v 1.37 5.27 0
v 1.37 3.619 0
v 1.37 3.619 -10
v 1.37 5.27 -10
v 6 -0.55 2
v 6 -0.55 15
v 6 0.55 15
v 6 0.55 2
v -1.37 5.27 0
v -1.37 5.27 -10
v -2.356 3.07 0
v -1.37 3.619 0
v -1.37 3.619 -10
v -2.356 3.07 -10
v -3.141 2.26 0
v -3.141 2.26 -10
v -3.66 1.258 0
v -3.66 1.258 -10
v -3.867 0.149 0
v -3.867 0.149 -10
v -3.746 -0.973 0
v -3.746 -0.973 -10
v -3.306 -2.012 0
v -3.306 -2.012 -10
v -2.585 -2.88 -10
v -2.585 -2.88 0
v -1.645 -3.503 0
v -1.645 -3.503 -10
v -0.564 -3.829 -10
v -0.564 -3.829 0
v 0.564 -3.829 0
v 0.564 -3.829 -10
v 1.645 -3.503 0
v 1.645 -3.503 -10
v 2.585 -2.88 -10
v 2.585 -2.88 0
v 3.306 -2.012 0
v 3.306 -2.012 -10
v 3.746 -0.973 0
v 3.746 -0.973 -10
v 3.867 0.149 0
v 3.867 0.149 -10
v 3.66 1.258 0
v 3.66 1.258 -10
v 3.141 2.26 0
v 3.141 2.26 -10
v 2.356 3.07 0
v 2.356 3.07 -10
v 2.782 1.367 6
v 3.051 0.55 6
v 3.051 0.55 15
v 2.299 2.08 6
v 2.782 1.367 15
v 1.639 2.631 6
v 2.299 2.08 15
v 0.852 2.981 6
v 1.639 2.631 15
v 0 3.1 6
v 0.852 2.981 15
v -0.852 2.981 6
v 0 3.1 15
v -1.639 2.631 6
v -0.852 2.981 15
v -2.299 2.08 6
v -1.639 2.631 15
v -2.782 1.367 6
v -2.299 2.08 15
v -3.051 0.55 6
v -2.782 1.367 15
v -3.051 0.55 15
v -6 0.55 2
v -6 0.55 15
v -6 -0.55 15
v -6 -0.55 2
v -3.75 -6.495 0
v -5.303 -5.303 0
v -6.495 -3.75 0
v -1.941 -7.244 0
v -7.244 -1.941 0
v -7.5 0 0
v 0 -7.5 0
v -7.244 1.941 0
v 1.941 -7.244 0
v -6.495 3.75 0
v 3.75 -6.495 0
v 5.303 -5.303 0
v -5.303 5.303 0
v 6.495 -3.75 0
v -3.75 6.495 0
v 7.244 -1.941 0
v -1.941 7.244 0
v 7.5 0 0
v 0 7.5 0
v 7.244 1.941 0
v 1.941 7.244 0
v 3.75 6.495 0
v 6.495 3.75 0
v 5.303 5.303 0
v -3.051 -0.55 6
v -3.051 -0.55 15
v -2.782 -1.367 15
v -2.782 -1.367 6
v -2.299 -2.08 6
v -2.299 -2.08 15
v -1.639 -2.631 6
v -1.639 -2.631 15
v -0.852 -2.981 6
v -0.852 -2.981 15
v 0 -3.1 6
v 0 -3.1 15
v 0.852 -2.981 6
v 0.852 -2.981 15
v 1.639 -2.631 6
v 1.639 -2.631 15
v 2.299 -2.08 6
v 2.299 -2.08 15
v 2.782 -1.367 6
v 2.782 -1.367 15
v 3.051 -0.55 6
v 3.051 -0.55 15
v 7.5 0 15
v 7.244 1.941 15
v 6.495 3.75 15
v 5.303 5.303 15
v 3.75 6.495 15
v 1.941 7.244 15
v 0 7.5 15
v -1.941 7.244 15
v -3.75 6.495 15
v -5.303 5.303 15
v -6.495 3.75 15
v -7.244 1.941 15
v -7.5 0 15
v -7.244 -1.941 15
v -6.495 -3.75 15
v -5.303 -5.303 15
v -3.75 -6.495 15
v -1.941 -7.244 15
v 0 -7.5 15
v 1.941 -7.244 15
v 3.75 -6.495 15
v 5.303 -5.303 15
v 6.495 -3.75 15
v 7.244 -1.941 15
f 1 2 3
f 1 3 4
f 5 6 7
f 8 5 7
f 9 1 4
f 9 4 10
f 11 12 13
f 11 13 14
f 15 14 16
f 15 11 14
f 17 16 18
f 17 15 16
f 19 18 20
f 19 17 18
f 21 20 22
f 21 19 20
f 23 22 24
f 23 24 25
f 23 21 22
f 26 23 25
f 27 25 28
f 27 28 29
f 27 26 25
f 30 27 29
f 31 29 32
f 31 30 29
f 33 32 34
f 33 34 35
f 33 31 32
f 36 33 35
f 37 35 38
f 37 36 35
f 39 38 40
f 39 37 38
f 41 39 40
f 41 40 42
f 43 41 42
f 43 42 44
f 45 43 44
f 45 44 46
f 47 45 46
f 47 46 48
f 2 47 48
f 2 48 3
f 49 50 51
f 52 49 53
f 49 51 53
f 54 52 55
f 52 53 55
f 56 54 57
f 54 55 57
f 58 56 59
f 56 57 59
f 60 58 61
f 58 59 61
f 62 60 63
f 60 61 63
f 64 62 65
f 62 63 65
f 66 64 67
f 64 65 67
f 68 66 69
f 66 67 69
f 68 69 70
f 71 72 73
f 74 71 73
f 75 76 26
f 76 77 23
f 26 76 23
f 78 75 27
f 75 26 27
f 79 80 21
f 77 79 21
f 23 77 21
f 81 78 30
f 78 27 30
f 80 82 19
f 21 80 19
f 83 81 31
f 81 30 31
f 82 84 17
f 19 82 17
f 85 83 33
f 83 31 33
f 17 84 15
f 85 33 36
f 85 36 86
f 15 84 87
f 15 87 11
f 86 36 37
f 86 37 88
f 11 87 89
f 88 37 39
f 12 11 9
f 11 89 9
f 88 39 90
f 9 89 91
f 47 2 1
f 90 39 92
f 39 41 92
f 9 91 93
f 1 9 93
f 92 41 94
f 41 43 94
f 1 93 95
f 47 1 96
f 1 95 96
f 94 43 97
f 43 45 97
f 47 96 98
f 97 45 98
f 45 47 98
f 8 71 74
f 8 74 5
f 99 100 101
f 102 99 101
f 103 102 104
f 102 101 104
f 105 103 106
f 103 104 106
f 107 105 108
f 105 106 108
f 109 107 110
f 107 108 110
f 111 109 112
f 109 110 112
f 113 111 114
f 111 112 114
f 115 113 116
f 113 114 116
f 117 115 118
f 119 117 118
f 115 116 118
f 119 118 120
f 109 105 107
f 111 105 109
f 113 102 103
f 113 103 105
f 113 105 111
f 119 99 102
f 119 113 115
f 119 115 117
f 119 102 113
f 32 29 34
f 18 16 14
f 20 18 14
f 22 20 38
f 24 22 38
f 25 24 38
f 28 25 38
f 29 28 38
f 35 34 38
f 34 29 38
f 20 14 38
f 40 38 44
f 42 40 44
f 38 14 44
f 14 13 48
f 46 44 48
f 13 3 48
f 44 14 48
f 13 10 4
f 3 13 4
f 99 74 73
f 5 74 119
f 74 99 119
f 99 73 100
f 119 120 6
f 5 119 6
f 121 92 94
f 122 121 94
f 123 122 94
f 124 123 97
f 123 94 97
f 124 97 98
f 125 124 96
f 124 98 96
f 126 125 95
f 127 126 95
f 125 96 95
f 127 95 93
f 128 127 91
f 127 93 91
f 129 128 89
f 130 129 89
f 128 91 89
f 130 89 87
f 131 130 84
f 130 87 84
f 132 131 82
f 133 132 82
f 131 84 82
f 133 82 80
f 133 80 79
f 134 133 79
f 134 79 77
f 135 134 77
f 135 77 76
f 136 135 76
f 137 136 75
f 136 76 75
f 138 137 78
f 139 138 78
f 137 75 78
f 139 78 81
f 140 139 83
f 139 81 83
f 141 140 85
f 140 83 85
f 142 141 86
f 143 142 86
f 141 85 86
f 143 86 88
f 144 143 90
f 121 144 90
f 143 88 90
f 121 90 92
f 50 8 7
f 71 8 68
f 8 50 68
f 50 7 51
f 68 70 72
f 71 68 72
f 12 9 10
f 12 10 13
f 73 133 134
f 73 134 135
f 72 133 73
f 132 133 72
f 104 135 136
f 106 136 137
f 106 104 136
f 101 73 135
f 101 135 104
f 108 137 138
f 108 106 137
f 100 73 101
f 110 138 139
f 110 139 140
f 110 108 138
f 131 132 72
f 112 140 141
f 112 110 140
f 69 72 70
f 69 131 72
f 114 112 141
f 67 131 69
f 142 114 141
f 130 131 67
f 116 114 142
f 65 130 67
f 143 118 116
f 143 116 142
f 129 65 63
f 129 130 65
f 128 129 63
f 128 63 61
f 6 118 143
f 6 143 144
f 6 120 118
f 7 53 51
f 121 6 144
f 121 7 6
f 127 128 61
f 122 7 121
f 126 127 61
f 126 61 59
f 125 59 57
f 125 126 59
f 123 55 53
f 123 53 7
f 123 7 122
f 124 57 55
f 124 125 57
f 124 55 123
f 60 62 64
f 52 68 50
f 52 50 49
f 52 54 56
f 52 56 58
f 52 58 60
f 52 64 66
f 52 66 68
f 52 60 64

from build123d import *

# Parameters (mm, degrees)
BOSS_EXTRUDE1_DEPTH = 10
SKETCH5_R           = 7.5
BOSS_EXTRUDE2_DEPTH = 15
SKETCH8_R           = 3.1
CUT_EXTRUDE1_DEPTH  = 9
CUT_EXTRUDE2_DEPTH  = 13


with BuildPart() as part:
    # Sketch4 → Boss-Extrude1 (new body)
    with BuildSketch(Plane.XY):
        with BuildLine():
            Line((-1.37, 5.27), (-1.37, 3.619392214))
            ThreePointArc((-1.37, 3.619392214), (0, -3.87), (1.37, 3.619392214))
            Line((1.37, 3.619392214), (1.37, 5.27))
            Line((1.37, 5.27), (-1.37, 5.27))
        make_face()
    extrude(amount=-BOSS_EXTRUDE1_DEPTH)

    # Sketch5 → Boss-Extrude2 (add)
    with BuildSketch(Plane.XY):
        Circle(SKETCH5_R)
    extrude(amount=BOSS_EXTRUDE2_DEPTH)

    # Sketch8 → Cut-Extrude1 (cut)
    with BuildSketch(Plane.XY.offset(15)):
        Circle(SKETCH8_R)
    extrude(amount=-CUT_EXTRUDE1_DEPTH, mode=Mode.SUBTRACT)

    # Sketch9 → Cut-Extrude2 (cut)
    with BuildSketch(Plane.XY.offset(15)):
        with BuildLine():
            Line((-3.1, 0), (0, 0))
            Line((0, 0), (3.1, 0))
            ThreePointArc((3.1, 0), (3.087680411, 0.276097227), (3.050819562, 0.55))
            Line((3.050819562, 0.55), (0, 0.55))
            Line((0, 0.55), (-3.050819562, 0.55))
            ThreePointArc((-3.050819562, 0.55), (-3.087680411, 0.276097227), (-3.1, 0))
        make_face()
        with BuildLine():
            Line((-6, 0), (-3.1, 0))
            ThreePointArc((-3.1, 0), (-3.087680411, 0.276097227), (-3.050819562, 0.55))
            Line((-3.050819562, 0.55), (-6, 0.55))
            Line((-6, 0.55), (-6, 0))
        make_face()
        with BuildLine():
            ThreePointArc((-3.050819562, -0.55), (-3.087680411, -0.276097227), (-3.1, 0))
            Line((-3.1, 0), (-6, 0))
            Line((-6, 0), (-6, -0.55))
            Line((-6, -0.55), (-3.050819562, -0.55))
        make_face()
        with BuildLine():
            Line((3.1, 0), (0, 0))
            Line((0, 0), (-3.1, 0))
            ThreePointArc((-3.1, 0), (-3.087680411, -0.276097227), (-3.050819562, -0.55))
            Line((-3.050819562, -0.55), (0, -0.55))
            Line((0, -0.55), (3.050819562, -0.55))
            ThreePointArc((3.050819562, -0.55), (3.087680411, -0.276097227), (3.1, 0))
        make_face()
        with BuildLine():
            Line((6, 0), (3.1, 0))
            ThreePointArc((3.1, 0), (3.087680411, -0.276097227), (3.050819562, -0.55))
            Line((3.050819562, -0.55), (6, -0.55))
            Line((6, -0.55), (6, 0))
        make_face()
        with BuildLine():
            ThreePointArc((3.050819562, 0.55), (3.087680411, 0.276097227), (3.1, 0))
            Line((3.1, 0), (6, 0))
            Line((6, 0), (6, 0.55))
            Line((6, 0.55), (3.050819562, 0.55))
        make_face()
    extrude(amount=-CUT_EXTRUDE2_DEPTH, mode=Mode.SUBTRACT)


solid = part.part
